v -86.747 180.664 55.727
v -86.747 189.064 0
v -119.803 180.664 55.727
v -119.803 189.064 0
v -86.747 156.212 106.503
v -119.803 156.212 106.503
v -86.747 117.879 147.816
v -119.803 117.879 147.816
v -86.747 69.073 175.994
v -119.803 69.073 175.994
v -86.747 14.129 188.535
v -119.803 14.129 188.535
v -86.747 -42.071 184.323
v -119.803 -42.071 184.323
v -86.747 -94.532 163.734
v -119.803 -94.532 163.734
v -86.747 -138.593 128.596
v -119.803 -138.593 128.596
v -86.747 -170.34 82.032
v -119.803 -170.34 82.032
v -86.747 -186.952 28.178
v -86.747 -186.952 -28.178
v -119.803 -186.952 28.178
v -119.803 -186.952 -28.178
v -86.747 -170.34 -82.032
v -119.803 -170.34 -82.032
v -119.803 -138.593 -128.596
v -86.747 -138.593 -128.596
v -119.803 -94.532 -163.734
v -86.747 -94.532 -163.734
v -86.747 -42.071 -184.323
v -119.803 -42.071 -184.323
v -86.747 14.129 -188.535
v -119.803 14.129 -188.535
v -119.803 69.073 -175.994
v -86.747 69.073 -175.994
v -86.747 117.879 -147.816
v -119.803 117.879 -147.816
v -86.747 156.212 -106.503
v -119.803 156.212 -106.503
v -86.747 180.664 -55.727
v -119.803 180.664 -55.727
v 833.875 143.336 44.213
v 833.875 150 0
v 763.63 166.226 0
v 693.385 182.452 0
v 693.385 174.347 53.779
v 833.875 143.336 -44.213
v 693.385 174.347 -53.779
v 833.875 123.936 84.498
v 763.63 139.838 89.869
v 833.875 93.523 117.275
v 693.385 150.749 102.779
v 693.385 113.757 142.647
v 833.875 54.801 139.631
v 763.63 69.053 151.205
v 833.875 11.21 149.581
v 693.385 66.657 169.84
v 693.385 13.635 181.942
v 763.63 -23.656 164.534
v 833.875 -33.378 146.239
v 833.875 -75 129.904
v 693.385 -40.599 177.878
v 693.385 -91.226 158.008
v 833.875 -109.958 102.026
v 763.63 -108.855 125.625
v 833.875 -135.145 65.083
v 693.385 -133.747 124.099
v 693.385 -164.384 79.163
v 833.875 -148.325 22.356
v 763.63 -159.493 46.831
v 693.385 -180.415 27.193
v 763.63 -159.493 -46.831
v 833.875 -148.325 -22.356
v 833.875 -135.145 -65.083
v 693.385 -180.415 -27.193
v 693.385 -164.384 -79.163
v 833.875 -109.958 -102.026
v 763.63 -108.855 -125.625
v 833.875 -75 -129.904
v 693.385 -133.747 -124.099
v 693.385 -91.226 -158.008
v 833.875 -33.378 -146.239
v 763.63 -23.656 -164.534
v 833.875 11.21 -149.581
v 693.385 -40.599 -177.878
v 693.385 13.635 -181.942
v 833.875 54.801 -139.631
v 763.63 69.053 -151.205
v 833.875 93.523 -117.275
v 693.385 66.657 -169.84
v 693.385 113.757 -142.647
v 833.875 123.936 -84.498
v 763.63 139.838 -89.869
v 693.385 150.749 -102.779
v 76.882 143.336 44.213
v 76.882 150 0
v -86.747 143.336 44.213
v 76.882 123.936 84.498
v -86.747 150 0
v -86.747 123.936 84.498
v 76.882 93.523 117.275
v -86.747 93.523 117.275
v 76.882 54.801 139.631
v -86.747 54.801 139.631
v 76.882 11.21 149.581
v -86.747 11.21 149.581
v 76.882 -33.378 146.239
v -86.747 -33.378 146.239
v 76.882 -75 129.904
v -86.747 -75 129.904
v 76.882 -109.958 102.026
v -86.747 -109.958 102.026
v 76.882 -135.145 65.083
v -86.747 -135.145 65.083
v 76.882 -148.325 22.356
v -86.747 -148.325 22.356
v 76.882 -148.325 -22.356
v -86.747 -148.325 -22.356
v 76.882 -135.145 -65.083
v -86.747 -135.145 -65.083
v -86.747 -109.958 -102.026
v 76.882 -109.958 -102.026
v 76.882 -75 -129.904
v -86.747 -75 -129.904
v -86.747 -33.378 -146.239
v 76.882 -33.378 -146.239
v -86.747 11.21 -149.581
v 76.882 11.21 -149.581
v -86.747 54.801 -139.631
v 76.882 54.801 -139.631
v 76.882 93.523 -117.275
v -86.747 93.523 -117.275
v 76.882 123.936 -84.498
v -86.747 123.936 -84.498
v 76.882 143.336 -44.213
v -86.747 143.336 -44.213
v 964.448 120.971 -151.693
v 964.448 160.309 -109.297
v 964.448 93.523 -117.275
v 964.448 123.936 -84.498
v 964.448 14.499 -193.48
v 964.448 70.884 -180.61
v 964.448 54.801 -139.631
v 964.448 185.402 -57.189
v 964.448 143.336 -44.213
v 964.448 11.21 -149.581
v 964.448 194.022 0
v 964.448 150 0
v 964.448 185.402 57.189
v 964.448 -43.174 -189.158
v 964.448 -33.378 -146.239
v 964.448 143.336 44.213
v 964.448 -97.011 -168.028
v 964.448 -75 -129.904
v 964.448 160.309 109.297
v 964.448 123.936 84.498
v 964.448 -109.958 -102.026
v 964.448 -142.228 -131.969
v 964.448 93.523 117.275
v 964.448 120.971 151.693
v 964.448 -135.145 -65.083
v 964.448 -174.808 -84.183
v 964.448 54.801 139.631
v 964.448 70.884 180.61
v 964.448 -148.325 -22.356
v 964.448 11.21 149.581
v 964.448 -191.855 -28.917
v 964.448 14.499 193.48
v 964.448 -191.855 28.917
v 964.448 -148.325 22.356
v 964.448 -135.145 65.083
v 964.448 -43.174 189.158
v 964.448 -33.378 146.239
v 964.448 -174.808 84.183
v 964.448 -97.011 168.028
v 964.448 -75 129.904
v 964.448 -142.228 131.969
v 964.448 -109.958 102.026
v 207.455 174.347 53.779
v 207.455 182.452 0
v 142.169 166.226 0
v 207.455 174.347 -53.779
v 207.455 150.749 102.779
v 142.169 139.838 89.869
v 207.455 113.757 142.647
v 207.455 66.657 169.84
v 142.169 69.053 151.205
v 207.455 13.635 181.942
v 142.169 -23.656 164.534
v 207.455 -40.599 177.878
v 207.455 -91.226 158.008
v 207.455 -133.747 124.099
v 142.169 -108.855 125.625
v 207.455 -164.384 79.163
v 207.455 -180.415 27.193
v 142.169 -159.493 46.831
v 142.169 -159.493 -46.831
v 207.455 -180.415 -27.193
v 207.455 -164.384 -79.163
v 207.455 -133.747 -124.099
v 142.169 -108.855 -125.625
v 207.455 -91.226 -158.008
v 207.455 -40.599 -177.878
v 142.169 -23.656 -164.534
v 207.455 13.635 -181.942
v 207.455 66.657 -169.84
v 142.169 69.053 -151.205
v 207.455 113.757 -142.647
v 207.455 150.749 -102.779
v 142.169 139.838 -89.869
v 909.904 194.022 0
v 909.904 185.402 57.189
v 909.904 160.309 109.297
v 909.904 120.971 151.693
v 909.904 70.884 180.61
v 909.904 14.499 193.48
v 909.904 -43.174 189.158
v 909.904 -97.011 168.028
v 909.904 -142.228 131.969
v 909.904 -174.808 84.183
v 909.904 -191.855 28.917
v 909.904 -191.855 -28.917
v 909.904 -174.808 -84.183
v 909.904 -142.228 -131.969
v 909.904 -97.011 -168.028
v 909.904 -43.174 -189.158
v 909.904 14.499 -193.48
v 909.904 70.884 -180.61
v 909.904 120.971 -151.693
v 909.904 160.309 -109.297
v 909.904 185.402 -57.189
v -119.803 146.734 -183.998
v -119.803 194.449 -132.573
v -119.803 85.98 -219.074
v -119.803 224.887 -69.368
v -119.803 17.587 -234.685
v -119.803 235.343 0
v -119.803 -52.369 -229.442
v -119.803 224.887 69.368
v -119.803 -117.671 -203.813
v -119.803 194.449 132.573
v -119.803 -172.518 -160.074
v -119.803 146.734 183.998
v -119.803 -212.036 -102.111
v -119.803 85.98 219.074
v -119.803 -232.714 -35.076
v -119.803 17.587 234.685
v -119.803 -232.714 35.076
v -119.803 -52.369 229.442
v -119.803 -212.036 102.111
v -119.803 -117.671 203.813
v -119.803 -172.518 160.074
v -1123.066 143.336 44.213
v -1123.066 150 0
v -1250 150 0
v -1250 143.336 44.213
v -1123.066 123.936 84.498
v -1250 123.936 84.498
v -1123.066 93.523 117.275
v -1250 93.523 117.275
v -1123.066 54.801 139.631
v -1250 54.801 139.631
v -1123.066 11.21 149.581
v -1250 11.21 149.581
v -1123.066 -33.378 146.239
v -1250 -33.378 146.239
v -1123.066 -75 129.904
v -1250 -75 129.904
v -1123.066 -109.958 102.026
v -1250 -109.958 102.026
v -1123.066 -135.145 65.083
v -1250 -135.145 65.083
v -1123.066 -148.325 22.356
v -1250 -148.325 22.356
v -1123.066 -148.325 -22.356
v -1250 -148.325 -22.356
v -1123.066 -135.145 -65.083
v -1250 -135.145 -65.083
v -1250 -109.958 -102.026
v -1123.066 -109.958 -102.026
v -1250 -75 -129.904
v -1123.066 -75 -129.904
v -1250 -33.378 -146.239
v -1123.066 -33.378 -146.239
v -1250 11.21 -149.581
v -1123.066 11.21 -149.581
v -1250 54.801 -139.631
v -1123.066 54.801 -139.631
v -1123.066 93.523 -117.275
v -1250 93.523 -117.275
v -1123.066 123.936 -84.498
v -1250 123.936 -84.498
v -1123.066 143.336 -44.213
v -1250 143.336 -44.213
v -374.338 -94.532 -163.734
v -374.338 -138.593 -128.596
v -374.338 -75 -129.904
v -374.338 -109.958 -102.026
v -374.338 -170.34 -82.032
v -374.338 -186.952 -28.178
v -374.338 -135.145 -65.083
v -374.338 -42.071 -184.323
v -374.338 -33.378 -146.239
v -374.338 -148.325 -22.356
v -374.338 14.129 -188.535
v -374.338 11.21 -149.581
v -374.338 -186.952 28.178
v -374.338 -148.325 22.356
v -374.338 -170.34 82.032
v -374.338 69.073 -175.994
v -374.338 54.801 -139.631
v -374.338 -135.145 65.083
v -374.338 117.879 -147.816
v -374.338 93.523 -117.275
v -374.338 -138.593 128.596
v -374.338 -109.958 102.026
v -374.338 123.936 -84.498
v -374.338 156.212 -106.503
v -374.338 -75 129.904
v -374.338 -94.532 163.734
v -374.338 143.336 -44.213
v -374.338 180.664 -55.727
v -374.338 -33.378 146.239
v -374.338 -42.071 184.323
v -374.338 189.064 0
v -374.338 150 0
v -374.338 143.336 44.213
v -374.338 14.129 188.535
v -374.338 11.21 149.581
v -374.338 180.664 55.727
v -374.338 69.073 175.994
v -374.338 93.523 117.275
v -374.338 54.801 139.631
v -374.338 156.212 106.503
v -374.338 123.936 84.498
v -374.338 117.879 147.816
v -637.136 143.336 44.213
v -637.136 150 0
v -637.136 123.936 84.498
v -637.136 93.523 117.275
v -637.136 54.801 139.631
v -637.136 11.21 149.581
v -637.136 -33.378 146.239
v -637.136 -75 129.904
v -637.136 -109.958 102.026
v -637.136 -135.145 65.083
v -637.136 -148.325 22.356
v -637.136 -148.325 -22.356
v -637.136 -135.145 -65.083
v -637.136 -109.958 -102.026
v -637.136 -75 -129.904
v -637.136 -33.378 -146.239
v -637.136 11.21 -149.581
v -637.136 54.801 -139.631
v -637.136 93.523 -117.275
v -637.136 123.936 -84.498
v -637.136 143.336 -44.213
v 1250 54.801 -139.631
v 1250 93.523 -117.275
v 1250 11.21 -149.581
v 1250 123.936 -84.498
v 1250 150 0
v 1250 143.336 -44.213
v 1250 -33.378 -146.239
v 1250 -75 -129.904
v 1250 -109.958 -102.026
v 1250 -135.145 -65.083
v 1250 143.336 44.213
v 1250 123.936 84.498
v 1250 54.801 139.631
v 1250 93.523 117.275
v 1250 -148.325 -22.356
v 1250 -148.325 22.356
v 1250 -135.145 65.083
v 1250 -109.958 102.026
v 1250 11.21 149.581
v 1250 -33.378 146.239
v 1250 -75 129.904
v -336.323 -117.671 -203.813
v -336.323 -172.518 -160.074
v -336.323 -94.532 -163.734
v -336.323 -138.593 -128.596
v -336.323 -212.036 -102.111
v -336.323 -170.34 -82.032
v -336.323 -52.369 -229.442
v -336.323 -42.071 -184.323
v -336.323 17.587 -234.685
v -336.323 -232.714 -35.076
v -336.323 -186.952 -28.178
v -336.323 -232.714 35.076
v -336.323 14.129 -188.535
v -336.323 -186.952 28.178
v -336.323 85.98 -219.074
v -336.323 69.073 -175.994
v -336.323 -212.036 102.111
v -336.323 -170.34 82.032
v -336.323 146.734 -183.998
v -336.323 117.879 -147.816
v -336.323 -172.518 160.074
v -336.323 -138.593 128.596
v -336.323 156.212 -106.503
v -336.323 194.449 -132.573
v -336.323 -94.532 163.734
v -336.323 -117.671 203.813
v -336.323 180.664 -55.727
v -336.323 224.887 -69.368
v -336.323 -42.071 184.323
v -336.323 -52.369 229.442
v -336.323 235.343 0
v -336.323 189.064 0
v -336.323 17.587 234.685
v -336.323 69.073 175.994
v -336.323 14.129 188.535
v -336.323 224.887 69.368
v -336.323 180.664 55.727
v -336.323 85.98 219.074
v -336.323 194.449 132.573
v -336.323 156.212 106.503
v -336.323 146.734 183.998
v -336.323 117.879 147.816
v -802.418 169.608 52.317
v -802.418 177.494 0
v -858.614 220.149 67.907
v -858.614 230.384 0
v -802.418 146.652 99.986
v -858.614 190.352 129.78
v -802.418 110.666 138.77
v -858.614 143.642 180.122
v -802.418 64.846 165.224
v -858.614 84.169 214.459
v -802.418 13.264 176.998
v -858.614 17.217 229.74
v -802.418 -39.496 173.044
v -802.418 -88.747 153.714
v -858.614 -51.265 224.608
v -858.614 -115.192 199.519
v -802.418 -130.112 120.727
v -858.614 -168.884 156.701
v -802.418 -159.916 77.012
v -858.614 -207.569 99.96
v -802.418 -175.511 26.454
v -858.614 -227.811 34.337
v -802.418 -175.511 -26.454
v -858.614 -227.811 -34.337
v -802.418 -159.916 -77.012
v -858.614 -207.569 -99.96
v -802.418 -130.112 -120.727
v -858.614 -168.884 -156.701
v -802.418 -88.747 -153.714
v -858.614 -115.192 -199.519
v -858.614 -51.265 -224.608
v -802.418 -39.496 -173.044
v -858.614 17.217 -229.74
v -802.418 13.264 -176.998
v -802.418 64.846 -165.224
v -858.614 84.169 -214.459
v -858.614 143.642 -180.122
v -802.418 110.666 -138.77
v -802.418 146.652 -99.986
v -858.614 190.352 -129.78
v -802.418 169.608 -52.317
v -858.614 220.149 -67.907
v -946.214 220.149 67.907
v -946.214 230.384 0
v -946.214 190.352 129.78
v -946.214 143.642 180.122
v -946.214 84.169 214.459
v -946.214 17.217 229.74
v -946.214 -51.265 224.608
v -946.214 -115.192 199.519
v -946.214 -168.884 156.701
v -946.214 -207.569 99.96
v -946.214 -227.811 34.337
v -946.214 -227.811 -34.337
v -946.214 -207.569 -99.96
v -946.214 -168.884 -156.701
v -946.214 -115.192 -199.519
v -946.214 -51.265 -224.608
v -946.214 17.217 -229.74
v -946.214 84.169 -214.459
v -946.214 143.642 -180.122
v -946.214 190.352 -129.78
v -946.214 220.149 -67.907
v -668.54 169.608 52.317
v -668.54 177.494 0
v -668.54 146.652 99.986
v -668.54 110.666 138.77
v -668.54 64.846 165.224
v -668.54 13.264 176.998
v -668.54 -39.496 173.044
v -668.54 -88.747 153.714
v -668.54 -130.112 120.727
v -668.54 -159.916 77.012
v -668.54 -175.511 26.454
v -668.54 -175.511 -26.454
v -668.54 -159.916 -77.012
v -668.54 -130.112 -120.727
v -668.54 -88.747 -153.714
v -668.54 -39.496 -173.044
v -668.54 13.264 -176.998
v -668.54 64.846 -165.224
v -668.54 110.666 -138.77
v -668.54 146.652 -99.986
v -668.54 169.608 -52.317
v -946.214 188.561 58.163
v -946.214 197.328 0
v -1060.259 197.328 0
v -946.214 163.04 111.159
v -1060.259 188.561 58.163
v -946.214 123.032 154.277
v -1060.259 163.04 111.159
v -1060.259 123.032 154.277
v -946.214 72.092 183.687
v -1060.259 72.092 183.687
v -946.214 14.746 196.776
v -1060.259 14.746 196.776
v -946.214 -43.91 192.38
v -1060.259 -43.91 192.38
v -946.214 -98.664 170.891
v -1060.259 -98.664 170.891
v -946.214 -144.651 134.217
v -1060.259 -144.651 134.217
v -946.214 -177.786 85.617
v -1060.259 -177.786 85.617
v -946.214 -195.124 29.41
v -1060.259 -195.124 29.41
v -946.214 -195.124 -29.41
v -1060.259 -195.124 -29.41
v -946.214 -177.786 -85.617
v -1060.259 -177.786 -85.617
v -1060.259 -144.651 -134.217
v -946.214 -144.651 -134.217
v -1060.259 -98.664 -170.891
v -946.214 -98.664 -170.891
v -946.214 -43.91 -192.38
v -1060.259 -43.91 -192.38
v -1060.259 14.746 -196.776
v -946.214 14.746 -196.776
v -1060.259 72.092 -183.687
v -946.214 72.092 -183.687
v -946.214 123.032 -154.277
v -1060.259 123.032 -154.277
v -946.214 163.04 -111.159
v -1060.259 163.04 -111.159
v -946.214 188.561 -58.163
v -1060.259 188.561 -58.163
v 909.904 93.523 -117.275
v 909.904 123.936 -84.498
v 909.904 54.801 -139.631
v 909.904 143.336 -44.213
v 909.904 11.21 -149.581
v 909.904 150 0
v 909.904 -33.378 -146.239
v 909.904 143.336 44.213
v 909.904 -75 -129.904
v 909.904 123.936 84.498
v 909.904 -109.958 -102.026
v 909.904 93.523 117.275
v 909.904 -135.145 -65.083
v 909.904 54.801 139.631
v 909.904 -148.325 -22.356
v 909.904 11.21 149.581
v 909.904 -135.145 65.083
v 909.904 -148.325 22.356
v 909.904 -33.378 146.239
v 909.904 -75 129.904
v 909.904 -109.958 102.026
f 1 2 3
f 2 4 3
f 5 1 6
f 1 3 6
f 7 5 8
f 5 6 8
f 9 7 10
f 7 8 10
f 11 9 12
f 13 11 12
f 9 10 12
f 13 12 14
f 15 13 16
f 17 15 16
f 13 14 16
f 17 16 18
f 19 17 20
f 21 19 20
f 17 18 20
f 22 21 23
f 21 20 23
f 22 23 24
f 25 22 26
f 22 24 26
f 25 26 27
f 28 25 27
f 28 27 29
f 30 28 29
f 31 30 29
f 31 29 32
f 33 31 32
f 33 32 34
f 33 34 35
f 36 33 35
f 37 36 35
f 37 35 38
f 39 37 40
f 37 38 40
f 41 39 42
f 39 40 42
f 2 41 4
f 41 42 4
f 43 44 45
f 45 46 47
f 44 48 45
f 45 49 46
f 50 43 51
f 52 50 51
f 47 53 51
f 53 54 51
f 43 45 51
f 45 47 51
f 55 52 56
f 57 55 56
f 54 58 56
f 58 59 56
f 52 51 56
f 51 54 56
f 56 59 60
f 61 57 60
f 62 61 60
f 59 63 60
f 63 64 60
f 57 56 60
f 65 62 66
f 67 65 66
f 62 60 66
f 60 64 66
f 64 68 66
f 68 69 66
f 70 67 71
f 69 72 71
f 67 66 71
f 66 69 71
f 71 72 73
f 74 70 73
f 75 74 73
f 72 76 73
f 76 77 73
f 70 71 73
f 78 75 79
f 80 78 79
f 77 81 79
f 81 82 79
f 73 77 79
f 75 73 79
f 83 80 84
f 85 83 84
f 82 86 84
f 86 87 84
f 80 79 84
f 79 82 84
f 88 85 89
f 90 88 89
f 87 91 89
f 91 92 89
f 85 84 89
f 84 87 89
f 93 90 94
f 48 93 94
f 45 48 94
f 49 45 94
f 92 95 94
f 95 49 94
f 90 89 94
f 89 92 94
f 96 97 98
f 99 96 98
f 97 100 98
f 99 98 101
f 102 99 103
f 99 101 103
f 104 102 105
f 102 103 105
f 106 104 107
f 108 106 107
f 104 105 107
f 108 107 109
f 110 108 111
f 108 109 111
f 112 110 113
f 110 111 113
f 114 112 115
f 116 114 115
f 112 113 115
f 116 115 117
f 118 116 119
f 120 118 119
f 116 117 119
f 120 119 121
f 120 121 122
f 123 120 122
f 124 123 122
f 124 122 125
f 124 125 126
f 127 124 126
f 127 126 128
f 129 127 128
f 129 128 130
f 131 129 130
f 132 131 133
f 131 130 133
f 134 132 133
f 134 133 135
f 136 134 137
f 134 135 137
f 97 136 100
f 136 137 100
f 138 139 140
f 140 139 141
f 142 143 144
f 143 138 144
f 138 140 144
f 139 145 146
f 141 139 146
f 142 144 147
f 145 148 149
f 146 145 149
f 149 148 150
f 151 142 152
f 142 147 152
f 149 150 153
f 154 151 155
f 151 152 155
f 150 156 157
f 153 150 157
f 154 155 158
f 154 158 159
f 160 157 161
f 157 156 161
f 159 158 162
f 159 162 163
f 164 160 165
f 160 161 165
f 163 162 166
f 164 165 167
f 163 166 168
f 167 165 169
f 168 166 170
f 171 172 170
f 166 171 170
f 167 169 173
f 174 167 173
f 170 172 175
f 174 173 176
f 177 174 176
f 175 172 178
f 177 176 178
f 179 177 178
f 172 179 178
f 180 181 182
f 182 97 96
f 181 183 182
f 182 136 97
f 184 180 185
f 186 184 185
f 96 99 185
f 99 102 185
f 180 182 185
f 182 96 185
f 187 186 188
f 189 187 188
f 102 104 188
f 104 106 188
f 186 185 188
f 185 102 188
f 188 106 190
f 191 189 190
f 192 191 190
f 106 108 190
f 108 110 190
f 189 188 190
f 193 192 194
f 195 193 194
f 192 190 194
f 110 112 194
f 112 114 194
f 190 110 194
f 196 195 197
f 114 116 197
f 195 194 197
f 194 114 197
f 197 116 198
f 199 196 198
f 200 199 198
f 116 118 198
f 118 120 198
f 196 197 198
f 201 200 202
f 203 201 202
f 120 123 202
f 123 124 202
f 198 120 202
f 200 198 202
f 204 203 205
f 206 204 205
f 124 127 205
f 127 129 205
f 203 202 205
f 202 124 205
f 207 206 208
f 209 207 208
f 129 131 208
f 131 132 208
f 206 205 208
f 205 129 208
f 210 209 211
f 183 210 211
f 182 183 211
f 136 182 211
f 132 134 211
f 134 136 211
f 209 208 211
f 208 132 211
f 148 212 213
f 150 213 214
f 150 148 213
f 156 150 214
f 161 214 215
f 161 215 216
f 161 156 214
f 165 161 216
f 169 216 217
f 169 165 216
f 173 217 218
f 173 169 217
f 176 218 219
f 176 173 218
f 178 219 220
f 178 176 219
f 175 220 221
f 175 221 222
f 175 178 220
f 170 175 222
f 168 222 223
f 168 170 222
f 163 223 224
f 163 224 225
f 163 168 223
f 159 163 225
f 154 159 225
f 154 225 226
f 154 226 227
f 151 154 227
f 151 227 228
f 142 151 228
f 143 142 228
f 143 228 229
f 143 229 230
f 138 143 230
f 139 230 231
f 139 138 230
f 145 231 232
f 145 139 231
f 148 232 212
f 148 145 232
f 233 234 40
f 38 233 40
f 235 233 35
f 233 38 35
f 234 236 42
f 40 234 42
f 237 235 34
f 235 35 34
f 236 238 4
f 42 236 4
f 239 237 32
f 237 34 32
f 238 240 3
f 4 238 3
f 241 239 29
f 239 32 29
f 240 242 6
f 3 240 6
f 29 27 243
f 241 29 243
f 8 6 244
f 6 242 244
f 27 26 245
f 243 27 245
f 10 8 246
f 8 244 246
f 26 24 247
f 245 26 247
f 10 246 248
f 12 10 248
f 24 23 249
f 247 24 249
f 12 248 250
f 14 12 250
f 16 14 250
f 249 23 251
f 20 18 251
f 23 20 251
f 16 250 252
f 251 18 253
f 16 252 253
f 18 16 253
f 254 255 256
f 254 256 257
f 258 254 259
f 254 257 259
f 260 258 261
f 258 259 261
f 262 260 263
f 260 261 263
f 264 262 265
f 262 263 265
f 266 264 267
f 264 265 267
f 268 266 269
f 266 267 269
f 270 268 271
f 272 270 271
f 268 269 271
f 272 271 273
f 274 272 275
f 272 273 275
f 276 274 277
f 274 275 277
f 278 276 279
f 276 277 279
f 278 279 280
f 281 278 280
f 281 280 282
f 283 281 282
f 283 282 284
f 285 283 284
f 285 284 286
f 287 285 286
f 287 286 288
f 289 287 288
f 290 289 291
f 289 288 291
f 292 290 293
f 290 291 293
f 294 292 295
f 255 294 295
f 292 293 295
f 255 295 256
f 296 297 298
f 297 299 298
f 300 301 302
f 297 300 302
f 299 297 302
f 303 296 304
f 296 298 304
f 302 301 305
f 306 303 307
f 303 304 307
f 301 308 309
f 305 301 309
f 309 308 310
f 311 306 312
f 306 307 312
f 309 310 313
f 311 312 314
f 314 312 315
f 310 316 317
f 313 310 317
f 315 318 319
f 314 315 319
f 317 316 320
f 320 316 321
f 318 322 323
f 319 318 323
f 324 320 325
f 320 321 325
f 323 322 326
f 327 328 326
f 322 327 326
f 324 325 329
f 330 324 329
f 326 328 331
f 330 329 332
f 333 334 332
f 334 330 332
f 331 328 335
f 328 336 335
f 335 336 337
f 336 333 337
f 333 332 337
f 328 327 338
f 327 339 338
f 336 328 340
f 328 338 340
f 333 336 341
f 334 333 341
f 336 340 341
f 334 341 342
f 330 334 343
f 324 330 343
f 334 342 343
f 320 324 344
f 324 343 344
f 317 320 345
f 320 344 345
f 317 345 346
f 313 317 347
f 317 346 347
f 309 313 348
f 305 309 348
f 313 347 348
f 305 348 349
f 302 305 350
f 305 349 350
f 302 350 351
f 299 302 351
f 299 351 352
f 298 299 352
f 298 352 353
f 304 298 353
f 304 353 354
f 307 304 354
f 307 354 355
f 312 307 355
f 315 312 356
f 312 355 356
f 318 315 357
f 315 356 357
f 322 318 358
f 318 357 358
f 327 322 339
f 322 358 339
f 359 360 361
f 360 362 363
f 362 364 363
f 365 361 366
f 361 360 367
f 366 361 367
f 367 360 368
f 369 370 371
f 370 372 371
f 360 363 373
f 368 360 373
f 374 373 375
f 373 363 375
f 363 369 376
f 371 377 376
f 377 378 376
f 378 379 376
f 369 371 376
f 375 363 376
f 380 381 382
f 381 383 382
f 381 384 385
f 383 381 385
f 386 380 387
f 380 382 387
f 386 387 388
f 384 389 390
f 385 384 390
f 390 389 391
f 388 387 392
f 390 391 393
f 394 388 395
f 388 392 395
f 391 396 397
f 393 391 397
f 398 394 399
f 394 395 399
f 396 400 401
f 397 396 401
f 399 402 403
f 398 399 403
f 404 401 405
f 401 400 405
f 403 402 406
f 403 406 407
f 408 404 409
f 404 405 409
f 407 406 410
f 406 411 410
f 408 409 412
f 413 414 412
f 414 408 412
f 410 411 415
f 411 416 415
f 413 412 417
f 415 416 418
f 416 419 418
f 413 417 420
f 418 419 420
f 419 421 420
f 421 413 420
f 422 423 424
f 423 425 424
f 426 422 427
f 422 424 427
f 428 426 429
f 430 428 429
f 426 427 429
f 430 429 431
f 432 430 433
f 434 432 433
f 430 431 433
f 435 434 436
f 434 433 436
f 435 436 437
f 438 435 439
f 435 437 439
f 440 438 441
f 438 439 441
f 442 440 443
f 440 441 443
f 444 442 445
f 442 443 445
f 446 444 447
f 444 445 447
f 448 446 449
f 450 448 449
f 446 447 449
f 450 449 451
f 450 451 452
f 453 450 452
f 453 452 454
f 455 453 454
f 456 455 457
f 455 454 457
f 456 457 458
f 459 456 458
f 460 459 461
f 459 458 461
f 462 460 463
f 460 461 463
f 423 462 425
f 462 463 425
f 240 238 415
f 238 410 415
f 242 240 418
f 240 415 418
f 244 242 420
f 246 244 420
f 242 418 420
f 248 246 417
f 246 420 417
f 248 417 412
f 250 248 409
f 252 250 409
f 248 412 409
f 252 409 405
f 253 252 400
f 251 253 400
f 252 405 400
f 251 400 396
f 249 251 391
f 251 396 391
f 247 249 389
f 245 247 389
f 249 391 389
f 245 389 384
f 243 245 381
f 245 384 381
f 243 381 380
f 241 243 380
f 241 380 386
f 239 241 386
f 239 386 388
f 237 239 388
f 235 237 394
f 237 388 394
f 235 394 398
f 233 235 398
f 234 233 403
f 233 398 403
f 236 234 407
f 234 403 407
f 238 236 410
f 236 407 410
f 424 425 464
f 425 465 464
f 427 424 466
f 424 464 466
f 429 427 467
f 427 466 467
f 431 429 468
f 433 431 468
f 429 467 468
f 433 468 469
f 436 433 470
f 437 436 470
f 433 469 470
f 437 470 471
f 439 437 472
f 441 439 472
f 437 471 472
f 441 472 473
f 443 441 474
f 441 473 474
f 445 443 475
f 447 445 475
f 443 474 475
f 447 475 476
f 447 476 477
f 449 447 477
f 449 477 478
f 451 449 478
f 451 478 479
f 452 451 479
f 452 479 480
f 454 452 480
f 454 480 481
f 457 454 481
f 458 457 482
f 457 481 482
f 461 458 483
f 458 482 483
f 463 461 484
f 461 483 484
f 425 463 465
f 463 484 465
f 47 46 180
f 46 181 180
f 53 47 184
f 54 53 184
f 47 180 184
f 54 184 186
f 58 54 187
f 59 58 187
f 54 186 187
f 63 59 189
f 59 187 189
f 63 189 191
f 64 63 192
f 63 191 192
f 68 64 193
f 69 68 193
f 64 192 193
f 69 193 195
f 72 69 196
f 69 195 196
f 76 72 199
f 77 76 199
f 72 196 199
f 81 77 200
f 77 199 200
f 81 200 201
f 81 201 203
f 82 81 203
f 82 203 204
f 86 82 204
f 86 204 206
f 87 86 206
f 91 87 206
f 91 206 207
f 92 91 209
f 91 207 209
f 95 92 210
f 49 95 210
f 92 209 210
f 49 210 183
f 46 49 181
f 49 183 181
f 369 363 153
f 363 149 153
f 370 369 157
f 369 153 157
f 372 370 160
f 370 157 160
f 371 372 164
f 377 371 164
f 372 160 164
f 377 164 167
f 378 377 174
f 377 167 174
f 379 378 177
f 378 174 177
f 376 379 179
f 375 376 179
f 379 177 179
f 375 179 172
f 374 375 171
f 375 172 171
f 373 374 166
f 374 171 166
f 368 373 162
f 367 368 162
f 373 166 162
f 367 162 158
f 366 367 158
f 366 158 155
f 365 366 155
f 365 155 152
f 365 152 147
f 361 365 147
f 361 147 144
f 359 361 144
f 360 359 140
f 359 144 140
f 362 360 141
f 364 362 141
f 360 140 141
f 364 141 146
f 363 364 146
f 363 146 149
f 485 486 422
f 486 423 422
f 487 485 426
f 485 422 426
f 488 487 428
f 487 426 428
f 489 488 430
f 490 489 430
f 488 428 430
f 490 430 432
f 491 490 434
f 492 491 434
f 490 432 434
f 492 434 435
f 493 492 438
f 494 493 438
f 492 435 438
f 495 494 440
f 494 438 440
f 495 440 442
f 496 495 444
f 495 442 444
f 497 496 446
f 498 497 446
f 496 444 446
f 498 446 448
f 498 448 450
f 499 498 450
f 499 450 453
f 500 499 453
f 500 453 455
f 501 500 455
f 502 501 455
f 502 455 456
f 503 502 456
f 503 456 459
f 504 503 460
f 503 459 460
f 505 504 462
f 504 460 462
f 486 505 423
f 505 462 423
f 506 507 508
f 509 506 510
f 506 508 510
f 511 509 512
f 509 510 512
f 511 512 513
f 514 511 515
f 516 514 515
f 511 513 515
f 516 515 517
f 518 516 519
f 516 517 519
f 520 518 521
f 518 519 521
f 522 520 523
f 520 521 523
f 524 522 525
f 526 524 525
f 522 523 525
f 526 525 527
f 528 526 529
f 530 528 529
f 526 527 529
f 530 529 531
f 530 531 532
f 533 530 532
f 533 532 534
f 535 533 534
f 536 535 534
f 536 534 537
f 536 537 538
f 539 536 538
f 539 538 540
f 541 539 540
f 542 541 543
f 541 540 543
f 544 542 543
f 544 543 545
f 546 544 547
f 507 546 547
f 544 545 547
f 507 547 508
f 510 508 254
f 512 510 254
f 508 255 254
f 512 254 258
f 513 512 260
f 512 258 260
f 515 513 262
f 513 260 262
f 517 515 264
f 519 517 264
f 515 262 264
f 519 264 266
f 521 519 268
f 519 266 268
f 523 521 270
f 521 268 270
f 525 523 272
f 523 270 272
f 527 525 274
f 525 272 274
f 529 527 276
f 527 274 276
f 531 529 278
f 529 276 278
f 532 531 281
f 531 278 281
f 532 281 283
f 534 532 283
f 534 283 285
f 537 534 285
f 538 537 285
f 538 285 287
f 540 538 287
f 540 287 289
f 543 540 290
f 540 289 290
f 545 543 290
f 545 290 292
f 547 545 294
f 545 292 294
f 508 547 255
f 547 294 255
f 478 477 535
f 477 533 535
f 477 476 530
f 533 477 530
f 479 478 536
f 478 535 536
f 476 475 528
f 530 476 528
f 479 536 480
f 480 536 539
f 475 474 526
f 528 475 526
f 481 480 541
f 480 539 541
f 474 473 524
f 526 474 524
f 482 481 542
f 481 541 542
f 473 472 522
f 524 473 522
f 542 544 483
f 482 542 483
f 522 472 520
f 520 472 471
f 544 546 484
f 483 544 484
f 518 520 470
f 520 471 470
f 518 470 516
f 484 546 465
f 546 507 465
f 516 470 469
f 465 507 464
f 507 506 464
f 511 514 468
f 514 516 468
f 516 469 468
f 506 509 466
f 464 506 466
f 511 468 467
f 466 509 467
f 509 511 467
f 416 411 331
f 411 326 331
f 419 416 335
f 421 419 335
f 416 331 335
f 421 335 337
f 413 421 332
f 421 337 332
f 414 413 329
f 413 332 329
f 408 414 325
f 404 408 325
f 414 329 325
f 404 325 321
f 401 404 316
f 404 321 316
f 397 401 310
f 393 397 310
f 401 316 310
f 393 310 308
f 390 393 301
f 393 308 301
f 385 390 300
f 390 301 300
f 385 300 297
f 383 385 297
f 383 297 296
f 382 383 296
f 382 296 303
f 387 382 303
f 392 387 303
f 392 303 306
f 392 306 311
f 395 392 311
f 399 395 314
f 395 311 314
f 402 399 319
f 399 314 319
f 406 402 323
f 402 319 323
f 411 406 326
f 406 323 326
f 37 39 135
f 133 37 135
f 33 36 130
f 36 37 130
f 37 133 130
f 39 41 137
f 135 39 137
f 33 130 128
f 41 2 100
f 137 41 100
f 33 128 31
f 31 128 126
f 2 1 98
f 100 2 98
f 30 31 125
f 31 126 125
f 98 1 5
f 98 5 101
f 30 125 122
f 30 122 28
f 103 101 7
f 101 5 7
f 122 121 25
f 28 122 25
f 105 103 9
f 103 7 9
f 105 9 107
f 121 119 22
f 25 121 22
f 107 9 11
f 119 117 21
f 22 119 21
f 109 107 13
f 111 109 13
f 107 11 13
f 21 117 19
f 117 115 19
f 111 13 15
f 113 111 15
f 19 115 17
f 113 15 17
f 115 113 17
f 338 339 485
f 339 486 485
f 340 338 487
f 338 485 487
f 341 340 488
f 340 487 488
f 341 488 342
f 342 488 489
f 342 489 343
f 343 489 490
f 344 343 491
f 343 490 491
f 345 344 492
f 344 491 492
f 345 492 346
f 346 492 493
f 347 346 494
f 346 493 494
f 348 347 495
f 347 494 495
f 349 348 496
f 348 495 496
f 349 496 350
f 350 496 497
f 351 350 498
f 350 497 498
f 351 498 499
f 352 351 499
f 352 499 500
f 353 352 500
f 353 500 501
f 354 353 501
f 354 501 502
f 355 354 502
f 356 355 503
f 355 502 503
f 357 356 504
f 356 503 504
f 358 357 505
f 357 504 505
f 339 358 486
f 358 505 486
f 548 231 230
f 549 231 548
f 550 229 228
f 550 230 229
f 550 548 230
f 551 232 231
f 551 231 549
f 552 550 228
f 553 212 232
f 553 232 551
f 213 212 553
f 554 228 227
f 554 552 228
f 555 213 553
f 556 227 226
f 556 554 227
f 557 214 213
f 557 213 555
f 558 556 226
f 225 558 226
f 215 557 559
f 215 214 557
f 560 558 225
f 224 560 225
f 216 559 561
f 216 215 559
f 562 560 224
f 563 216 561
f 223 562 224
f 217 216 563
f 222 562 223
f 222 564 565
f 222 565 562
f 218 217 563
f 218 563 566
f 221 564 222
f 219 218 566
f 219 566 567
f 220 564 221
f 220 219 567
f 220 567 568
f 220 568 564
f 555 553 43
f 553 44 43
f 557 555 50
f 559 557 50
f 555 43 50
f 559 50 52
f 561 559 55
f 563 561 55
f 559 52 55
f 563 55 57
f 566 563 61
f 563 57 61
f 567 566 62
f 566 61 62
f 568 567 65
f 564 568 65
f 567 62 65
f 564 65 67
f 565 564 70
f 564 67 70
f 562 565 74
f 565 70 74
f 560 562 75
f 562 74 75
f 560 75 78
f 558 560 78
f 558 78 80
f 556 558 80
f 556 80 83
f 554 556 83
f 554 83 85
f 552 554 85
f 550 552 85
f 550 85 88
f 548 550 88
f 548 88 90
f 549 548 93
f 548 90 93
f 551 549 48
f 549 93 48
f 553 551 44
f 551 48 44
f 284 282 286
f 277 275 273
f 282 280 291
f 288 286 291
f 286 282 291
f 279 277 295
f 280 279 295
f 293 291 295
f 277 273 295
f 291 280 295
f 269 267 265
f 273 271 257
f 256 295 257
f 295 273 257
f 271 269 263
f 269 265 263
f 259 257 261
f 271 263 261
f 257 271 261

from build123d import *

# Parameters (mm, degrees)
F0_W = 54.543138
F0_H = 44.022134


with BuildPart() as f1:
    # F0 (on Top) → F1 (revolve)
    with BuildSketch(Plane.XY):
        Polygon((-1250, 150), (-1250, 0), (1250, 0), (1250, 150), (964.447558, 150), (909.90442, 150), (833.874702, 150), (76.882489, 150), (-86.746827, 150), (-374.337733, 150), (-637.13634, 150), (-1123.065829, 150), align=None)
        Polygon((-1060.258627, 197.327778), (-1123.065829, 150), (-637.13634, 150), (-668.539941, 177.4939), (-802.41847, 177.4939), (-858.614385, 230.384186), (-946.213901, 230.384186), (-946.213901, 197.327778), align=None)
        with Locations((937.175989, 172.011067)):
            Rectangle(F0_W, F0_H)
        Polygon((-374.337733, 189.063668), (-374.337733, 150), (-86.746827, 150), (-86.746827, 189.063668), (-119.80325, 189.063668), (-119.80325, 235.342652), (-336.322844, 235.342652), (-336.322844, 189.063668), align=None)
        Polygon((76.882489, 150), (833.874702, 150), (693.384826, 182.452381), (207.455367, 182.452381), align=None)
    revolve(axis=Axis((0, 0, 0), (1, 0, 0)))


solid = f1.part
